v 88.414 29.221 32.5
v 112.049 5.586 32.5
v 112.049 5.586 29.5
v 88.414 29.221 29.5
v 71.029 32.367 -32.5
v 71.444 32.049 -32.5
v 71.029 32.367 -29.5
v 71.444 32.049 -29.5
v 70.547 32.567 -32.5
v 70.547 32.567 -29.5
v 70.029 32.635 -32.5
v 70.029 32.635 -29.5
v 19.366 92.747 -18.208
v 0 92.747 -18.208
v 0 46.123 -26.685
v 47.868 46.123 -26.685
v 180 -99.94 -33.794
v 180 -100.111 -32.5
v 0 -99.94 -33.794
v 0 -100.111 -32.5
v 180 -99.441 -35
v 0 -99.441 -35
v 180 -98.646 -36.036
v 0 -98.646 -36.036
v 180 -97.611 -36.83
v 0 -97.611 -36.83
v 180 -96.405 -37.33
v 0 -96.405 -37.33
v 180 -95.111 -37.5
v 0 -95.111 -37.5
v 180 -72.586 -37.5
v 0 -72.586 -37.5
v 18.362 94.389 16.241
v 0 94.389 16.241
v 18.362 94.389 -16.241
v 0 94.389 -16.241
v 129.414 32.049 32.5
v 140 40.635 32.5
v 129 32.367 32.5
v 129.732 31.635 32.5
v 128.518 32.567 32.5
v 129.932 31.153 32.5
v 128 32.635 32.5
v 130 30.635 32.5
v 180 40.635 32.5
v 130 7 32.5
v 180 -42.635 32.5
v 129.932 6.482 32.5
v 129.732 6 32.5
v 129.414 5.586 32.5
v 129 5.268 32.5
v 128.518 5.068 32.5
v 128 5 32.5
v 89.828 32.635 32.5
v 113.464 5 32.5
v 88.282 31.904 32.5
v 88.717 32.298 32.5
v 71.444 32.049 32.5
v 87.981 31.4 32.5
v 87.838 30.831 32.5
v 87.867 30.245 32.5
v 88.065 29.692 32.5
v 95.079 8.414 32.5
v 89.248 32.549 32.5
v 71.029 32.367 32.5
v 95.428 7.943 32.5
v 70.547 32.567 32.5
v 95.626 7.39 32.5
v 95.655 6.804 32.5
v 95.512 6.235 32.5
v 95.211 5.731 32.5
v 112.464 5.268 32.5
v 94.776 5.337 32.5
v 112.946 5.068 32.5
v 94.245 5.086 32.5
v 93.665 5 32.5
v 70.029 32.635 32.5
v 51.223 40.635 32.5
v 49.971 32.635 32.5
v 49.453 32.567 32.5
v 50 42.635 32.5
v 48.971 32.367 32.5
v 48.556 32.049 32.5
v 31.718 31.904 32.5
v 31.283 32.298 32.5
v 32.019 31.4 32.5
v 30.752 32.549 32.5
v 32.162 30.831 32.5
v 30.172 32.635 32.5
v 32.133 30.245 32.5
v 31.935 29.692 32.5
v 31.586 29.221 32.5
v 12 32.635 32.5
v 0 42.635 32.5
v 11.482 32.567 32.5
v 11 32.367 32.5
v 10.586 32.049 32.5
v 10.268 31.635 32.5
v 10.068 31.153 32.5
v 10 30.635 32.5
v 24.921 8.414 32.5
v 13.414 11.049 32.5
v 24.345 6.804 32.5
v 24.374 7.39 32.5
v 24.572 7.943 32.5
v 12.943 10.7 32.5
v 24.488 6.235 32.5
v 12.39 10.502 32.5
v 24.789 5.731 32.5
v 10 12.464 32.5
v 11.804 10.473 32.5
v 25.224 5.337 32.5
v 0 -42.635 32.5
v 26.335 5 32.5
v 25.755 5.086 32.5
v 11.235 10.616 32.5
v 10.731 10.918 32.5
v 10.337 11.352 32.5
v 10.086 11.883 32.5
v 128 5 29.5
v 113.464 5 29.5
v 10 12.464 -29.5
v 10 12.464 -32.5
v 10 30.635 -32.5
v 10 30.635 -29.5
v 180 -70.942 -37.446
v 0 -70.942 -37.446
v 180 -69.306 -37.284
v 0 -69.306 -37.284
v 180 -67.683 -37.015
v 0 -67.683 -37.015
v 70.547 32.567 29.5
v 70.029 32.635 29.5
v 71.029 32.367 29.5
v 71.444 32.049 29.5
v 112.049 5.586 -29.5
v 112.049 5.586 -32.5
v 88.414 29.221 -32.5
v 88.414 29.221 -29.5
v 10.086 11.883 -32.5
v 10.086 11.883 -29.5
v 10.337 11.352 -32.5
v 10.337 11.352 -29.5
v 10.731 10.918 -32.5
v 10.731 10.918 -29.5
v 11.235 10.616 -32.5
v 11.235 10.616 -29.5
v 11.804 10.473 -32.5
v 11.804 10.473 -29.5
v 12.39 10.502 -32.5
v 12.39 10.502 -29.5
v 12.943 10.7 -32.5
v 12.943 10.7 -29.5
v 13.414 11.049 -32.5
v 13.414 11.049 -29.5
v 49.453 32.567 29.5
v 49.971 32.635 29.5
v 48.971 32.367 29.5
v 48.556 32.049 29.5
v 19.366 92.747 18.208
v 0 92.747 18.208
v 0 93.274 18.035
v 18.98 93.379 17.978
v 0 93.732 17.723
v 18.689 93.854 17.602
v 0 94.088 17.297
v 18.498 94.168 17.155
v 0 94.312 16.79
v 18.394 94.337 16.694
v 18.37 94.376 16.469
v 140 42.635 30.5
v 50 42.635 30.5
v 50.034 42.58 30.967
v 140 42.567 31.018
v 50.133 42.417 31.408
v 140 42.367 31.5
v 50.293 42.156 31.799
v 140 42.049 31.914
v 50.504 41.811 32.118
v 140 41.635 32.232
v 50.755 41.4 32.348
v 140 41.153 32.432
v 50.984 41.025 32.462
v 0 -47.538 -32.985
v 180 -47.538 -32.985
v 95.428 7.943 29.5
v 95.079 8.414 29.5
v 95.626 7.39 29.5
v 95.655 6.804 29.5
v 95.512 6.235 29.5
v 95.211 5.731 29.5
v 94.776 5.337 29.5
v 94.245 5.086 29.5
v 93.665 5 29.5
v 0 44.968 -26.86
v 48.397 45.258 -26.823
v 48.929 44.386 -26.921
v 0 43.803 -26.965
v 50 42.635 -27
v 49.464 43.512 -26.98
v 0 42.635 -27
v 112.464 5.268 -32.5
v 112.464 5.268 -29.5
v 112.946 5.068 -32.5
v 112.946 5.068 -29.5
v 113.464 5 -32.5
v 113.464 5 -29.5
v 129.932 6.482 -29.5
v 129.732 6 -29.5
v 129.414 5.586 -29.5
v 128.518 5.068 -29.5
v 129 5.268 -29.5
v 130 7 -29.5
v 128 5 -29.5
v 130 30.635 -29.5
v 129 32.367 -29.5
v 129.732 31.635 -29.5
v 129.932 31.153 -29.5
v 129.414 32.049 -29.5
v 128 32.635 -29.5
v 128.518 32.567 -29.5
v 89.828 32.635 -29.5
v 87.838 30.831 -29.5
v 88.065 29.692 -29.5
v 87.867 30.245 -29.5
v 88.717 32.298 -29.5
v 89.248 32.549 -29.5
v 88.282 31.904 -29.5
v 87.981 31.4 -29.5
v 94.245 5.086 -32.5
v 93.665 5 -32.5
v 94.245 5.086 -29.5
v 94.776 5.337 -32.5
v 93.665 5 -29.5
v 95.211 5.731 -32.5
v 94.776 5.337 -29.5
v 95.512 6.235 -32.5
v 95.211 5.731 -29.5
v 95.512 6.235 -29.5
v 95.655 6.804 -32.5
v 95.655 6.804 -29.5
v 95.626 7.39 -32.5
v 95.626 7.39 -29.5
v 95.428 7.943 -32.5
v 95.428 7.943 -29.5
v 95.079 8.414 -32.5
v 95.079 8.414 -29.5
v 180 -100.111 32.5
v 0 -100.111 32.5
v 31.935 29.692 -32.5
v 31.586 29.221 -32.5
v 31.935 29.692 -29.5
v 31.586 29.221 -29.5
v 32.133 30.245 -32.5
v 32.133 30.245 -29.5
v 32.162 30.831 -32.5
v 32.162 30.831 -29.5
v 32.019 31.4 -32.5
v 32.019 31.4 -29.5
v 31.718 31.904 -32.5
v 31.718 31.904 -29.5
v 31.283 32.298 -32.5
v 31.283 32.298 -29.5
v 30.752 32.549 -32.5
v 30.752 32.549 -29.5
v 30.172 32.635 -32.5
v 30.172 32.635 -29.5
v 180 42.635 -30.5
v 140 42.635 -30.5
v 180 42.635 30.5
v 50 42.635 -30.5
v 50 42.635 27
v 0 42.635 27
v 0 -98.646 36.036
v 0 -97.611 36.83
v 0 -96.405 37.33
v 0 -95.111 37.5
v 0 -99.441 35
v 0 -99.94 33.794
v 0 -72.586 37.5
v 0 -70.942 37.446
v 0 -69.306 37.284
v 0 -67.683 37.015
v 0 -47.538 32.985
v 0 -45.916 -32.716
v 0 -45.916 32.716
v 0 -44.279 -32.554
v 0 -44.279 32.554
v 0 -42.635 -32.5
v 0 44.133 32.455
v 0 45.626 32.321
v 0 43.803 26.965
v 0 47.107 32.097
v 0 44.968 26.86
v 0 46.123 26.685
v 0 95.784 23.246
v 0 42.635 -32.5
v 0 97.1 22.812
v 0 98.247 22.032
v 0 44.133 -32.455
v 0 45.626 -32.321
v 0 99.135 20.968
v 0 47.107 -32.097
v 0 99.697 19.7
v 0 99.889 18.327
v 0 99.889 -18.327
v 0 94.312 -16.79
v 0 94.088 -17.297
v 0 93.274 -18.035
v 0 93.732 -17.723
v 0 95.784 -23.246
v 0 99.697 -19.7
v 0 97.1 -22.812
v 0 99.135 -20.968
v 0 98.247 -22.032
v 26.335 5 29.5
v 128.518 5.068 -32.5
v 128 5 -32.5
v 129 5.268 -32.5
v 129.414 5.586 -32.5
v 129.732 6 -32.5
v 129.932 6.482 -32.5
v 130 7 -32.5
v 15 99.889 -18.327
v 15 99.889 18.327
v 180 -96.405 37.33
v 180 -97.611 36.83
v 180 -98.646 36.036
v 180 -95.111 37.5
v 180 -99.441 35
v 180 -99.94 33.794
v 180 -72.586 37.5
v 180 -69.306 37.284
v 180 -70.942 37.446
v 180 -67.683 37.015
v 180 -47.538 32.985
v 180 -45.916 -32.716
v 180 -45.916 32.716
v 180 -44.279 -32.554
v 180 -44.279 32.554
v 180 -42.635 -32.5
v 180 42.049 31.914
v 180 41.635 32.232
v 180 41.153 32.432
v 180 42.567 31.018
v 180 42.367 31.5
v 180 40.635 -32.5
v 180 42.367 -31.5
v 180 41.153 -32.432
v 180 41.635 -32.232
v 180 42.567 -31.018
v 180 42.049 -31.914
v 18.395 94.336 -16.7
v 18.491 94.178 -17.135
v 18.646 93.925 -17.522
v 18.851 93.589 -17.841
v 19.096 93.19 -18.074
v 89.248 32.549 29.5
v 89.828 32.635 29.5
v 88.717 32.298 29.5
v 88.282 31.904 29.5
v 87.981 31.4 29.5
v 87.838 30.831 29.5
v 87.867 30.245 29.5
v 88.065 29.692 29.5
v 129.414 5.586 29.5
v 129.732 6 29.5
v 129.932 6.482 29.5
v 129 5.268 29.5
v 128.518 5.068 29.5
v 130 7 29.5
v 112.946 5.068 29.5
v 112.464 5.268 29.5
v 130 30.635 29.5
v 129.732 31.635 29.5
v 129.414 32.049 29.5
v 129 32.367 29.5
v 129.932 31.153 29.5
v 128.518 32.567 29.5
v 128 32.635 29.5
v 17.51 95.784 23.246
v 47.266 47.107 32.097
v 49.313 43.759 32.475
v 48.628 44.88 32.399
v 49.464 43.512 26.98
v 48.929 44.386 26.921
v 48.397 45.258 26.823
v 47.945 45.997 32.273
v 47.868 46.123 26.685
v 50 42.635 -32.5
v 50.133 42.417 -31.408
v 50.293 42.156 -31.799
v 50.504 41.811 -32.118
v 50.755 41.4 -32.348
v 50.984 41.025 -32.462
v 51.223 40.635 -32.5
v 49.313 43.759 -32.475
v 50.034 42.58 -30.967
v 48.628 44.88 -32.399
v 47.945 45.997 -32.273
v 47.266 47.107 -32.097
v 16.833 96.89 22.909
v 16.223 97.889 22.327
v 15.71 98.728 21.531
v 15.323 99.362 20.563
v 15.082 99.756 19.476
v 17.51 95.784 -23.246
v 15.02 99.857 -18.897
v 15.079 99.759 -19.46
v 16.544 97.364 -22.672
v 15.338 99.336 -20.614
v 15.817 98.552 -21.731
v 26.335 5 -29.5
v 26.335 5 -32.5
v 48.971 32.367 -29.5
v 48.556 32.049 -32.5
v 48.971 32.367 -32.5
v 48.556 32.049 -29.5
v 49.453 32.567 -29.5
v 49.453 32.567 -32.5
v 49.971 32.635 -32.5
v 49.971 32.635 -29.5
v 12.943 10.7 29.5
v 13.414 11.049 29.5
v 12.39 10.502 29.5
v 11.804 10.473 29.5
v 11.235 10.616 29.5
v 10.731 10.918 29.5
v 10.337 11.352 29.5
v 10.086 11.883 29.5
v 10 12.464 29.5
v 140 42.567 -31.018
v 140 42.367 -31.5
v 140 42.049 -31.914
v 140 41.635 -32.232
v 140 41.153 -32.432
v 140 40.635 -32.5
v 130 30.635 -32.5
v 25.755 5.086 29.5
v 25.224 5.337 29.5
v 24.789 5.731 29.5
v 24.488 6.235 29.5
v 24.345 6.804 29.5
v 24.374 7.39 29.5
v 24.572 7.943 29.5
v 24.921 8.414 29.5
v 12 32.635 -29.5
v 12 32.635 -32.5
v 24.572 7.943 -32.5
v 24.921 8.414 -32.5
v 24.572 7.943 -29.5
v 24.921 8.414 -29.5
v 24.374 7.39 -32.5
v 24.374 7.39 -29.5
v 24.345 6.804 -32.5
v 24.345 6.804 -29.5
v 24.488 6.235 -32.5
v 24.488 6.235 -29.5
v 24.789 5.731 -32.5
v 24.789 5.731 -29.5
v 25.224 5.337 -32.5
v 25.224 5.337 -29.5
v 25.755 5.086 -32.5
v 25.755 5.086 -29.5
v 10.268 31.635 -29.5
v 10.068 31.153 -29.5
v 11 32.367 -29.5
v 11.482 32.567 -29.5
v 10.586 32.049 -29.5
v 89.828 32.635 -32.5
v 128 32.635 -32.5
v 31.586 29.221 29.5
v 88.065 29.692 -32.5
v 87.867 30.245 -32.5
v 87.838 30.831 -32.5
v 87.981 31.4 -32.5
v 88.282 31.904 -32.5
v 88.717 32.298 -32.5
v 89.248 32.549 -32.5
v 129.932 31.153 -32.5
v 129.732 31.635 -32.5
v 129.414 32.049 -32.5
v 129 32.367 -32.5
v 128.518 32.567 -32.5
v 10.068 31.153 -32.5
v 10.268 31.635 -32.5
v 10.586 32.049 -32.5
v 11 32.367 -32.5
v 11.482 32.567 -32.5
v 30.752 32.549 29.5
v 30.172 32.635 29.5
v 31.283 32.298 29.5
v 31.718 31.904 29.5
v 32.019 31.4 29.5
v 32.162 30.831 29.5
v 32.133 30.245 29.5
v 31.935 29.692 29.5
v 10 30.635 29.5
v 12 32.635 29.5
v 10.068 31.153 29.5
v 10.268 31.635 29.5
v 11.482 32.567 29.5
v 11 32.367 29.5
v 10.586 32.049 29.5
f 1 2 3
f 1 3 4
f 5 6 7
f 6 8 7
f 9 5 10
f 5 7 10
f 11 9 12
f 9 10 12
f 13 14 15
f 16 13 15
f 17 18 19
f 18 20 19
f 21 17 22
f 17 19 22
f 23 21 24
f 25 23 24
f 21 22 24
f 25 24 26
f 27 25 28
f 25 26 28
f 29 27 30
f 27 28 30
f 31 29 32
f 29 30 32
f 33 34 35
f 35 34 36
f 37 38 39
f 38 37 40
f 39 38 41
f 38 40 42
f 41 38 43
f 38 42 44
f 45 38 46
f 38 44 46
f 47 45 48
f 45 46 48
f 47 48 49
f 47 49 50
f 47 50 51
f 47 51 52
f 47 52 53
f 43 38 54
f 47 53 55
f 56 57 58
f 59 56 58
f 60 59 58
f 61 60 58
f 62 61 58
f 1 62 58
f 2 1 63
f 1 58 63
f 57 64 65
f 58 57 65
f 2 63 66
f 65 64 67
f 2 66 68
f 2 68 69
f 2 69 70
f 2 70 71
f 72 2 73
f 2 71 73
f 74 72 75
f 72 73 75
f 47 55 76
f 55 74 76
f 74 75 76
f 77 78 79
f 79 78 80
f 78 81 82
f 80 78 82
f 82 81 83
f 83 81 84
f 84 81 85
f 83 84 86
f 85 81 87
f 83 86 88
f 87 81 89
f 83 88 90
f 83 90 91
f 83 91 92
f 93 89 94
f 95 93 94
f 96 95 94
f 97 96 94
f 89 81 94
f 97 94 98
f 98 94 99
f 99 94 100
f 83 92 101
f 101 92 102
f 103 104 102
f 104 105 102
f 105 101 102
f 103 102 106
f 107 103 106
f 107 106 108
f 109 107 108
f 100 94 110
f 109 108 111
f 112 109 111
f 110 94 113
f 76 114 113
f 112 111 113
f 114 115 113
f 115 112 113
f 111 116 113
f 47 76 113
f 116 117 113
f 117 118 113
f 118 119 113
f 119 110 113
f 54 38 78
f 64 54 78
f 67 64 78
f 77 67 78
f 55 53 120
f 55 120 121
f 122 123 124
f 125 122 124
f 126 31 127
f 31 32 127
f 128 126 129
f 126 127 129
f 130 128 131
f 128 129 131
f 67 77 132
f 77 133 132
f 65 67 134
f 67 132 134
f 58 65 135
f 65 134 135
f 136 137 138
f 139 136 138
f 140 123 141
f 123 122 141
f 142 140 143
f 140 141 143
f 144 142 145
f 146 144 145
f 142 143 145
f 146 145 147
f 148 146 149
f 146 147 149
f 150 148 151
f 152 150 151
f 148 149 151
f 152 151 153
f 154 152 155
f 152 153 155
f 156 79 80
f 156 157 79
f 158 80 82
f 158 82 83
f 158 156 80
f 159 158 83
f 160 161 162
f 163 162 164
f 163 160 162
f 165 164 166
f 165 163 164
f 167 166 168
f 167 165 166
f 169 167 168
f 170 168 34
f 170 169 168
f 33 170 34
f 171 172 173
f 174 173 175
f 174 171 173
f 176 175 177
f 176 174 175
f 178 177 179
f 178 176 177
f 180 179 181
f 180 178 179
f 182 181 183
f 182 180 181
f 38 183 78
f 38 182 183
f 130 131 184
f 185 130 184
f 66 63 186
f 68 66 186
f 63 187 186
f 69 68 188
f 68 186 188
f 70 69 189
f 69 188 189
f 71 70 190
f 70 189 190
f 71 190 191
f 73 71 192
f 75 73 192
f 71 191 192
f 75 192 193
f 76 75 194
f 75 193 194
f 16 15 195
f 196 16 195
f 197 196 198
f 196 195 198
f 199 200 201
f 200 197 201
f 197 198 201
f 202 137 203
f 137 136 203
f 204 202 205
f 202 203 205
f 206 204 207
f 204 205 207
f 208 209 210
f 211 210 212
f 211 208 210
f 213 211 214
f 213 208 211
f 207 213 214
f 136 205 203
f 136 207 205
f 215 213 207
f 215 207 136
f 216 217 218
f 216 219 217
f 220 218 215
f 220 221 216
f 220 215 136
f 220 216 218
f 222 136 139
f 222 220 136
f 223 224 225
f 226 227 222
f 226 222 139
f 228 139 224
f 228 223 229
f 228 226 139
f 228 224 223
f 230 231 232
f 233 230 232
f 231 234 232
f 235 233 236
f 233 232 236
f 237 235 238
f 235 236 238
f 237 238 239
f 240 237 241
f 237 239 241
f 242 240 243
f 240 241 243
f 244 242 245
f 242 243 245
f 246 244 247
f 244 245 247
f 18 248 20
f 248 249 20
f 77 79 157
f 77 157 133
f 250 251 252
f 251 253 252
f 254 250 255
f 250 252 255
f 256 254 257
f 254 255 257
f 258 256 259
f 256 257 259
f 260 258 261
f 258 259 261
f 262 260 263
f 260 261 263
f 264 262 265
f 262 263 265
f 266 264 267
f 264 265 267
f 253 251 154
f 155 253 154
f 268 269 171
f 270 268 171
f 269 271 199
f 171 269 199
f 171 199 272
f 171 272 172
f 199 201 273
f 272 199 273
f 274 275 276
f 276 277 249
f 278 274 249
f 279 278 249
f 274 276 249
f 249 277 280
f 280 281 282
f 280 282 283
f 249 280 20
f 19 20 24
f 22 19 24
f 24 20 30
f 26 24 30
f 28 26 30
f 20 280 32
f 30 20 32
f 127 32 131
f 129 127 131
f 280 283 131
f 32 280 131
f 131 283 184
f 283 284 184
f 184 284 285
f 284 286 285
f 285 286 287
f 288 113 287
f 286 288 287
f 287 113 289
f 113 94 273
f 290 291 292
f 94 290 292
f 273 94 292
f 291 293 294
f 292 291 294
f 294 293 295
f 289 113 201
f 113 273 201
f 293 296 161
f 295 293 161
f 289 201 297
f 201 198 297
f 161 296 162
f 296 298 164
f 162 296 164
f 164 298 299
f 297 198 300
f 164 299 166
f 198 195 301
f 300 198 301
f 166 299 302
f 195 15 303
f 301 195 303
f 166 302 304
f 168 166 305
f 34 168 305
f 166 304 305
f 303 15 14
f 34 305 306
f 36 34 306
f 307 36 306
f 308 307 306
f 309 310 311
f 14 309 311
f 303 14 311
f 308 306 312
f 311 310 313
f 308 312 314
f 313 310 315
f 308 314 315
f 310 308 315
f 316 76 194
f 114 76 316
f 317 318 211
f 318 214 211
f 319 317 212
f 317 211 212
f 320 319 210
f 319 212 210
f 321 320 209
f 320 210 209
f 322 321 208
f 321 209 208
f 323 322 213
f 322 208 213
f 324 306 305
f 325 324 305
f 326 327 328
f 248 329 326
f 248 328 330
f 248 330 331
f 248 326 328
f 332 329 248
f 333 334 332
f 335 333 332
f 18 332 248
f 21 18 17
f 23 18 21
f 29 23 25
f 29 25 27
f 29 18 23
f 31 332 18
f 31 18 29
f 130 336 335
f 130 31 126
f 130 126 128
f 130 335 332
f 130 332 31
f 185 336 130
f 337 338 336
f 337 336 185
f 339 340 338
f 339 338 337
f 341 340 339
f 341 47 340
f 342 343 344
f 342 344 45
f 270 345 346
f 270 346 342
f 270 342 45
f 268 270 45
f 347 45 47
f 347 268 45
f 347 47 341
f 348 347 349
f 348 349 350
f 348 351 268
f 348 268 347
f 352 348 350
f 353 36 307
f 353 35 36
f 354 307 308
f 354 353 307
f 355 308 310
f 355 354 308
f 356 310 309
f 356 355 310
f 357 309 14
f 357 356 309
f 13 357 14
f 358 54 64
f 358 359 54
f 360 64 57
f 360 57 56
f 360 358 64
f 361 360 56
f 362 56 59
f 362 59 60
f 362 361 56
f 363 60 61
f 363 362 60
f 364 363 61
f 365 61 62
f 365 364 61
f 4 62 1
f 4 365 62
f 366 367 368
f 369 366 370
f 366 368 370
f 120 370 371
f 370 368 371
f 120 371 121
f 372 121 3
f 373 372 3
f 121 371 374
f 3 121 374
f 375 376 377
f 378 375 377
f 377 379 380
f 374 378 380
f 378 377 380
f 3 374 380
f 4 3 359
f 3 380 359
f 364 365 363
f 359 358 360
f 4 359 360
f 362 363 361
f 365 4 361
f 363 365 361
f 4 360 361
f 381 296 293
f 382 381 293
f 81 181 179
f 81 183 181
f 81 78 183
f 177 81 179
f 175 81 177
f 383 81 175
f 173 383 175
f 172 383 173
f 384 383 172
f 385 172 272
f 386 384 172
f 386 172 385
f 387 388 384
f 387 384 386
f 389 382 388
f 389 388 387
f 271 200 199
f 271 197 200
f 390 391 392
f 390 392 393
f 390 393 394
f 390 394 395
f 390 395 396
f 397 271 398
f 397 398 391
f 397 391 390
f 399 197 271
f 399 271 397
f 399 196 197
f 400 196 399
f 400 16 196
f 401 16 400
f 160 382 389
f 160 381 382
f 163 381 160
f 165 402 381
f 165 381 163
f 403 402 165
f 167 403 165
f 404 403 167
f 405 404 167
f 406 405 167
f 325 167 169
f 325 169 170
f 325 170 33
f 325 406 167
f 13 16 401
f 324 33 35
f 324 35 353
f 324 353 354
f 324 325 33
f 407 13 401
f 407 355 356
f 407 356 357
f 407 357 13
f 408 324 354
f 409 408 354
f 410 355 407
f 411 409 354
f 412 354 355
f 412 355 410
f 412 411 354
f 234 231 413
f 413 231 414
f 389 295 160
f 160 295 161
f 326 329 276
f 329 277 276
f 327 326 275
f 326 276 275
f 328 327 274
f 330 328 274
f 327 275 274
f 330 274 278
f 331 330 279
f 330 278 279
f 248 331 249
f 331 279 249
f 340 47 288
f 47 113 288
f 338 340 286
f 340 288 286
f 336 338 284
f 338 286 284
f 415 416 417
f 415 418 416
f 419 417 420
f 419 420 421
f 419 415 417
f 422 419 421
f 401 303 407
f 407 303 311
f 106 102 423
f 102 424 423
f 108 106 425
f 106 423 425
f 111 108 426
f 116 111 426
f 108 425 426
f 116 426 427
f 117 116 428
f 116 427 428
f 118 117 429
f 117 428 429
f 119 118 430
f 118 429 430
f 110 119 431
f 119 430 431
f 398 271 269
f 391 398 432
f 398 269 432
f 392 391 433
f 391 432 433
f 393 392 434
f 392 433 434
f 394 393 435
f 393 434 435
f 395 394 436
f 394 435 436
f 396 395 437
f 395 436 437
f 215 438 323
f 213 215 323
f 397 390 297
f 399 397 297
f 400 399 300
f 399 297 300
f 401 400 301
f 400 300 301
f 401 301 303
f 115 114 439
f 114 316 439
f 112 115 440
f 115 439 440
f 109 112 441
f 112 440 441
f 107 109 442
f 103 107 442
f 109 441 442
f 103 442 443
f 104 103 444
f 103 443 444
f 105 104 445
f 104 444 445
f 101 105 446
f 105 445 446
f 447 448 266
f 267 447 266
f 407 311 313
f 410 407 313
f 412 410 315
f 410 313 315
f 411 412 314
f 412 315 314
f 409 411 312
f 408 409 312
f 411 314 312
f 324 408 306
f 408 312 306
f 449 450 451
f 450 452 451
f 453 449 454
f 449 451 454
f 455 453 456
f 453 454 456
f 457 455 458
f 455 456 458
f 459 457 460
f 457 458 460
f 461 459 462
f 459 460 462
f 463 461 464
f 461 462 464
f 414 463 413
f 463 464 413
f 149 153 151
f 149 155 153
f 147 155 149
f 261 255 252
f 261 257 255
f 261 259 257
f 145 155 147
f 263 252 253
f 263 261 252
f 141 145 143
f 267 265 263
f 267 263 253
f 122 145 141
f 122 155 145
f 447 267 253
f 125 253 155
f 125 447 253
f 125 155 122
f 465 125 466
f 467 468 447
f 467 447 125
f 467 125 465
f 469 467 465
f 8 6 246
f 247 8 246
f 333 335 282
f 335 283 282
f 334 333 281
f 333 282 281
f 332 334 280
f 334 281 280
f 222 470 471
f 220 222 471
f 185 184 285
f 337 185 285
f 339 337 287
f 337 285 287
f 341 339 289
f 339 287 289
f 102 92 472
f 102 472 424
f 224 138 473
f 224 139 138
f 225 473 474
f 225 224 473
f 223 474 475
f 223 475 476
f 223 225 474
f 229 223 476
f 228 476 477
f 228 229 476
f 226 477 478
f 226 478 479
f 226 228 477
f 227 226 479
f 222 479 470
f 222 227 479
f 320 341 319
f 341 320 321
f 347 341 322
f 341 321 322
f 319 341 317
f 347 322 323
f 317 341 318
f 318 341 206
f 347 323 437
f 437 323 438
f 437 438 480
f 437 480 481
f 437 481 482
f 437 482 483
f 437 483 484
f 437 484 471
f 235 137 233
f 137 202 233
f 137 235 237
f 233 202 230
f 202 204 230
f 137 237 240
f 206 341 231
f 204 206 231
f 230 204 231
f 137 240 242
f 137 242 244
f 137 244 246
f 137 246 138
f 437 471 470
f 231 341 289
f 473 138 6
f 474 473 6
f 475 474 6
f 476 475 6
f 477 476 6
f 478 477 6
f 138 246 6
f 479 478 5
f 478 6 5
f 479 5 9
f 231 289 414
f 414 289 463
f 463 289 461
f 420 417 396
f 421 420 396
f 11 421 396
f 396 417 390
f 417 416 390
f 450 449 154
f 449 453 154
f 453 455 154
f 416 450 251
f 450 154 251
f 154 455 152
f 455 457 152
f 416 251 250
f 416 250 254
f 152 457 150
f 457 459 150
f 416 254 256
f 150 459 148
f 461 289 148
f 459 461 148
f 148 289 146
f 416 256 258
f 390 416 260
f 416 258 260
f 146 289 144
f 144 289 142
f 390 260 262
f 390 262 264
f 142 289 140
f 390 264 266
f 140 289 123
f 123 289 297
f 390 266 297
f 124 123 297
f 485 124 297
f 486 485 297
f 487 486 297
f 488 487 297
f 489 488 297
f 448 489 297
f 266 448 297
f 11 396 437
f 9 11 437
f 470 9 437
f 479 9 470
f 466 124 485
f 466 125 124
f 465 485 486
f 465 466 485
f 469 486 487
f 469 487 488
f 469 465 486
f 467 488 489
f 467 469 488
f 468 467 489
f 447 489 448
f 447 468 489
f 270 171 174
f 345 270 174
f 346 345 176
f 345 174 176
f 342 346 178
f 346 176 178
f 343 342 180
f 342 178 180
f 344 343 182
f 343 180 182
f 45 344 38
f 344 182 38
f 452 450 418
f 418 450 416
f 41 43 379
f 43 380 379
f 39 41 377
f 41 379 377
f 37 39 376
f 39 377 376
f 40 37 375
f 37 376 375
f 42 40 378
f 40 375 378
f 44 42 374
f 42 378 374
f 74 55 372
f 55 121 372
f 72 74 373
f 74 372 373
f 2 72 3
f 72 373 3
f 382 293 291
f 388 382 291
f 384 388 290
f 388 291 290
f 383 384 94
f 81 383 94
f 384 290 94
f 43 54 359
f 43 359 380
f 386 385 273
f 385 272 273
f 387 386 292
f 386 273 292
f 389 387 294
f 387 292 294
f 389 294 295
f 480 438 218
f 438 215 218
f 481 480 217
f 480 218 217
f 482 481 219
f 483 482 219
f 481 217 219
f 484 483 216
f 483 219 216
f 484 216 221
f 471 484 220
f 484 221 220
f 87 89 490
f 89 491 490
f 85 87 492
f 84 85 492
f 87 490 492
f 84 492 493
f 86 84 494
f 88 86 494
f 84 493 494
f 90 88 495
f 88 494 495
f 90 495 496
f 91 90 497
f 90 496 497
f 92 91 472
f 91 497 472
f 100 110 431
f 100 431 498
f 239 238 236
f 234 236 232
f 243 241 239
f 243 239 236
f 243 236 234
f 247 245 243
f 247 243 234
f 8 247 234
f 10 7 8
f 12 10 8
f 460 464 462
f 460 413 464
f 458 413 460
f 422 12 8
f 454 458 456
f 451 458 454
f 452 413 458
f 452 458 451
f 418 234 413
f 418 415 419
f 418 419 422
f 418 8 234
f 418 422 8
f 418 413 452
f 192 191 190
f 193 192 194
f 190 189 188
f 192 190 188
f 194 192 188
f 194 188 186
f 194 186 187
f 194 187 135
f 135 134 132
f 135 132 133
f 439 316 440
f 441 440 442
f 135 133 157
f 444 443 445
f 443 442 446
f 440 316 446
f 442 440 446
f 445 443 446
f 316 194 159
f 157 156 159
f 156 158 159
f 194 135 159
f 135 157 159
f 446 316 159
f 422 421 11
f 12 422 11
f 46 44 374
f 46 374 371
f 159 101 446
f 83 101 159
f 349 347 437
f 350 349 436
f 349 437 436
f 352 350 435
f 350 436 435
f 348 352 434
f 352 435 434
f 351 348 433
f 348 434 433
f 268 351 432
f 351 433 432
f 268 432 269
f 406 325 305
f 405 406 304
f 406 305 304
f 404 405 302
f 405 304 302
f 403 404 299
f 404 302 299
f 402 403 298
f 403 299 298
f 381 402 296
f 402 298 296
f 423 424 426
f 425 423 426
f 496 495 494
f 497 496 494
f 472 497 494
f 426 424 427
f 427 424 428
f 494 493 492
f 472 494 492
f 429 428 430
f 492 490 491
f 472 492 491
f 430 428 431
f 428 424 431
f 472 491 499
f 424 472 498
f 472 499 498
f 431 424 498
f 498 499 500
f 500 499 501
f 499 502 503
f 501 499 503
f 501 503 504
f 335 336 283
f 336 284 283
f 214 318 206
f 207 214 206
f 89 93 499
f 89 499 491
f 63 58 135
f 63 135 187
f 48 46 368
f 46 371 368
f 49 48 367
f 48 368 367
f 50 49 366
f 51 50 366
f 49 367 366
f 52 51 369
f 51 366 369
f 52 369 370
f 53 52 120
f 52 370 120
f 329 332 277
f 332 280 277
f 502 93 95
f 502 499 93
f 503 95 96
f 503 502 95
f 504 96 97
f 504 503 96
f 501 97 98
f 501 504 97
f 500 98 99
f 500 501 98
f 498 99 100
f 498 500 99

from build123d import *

# Parameters (mm, degrees)
EXTRUDE_2_DEPTH        = 140
SKETCH_7_W             = 65
SKETCH_7_H             = 74.928349175
CUT_EXTRUDE_2_DEPTH    = 150
CUT_EXTRUDE_3_DEPTH    = 150
FILLET_1_R             = 2
FILLET_2_R             = 2
CUT_EXTRUDE_4_DEPTH    = 3
FILLET_3_R             = 2
FILLET_3_OF_MIRROR_1_R = 2
EXTRUDE_3_DEPTH        = 40


with BuildPart() as part:
    # 草图2 → 凸台-拉伸2 (new body)
    with BuildSketch(Plane(origin=(0, 0, 0), x_dir=(0, 0, -1), z_dir=(1, 0, 0))):
        with BuildLine():
            Line((37.5, -95.110619623), (37.5, -72.586107463))
            ThreePointArc((37.5, -72.586107463), (37.378333167, -70.122667014), (37.014516892, -67.683204084))
            Line((37.014516892, -67.683204084), (32.985483108, -47.538035162))
            ThreePointArc((32.985483108, -47.538035162), (32.621666833, -45.098572232), (32.5, -42.635131783))
            Line((32.5, -42.635131783), (32.5, 42.635131783))
            ThreePointArc((32.5, 42.635131783), (32.398982849, 44.880271666), (32.096747752, 47.107267738))
            Line((32.096747752, 47.107267738), (23.246467783, 95.783807568))
            ThreePointArc((23.246467783, 95.783807568), (21.530855429, 98.728139028), (18.327118233, 99.889380377))
            Line((18.327118233, 99.889380377), (-18.327118233, 99.889380377))
            ThreePointArc((-18.327118233, 99.889380377), (-21.530855429, 98.728139028), (-23.246467783, 95.783807568))
            Line((-23.246467783, 95.783807568), (-32.096747752, 47.107267738))
            ThreePointArc((-32.096747752, 47.107267738), (-32.398982849, 44.880271666), (-32.5, 42.635131783))
            Line((-32.5, 42.635131783), (-32.5, -42.635131783))
            ThreePointArc((-32.5, -42.635131783), (-32.621666833, -45.098572232), (-32.985483108, -47.538035162))
            Line((-32.985483108, -47.538035162), (-37.014516892, -67.683204084))
            ThreePointArc((-37.014516892, -67.683204084), (-37.378333167, -70.122667014), (-37.5, -72.586107463))
            Line((-37.5, -72.586107463), (-37.5, -95.110619623))
            ThreePointArc((-37.5, -95.110619623), (-36.035533906, -98.646153529), (-32.5, -100.110619623))
            Line((-32.5, -100.110619623), (32.5, -100.110619623))
            ThreePointArc((32.5, -100.110619623), (36.035533906, -98.646153529), (37.5, -95.110619623))
        make_face()
    extrude(amount=EXTRUDE_2_DEPTH)

    # 草图7 → 切除-拉伸2 (cut, along a direction that is not the sketch's normal)
    with BuildSketch(Plane(origin=(55.371135265, 33.848837106, 0), x_dir=(0, 0, -1), z_dir=(0.853206949, 0.521572529, 0))):
        with Locations((0, 47.762138861)):
            Rectangle(SKETCH_7_W, SKETCH_7_H)
    extrude(amount=CUT_EXTRUDE_2_DEPTH, dir=(1, 0, 0), mode=Mode.SUBTRACT)

    # 草图8 → 切除-拉伸3 (cut)
    with BuildSketch(Plane.ZY):
        with BuildLine():
            Line((17.909830056, 94.389380377), (-17.909830056, 94.389380377))
            Line((-17.909830056, 94.389380377), (-26.685463247, 46.123397828))
            ThreePointArc((-26.685463247, 46.123397828), (-26.921206622, 44.386340892), (-27, 42.635131783))
            Line((-27, 42.635131783), (27, 42.635131783))
            ThreePointArc((27, 42.635131783), (26.921206622, 44.386340892), (26.685463247, 46.123397828))
            Line((26.685463247, 46.123397828), (17.909830056, 94.389380377))
        make_face()
    extrude(amount=-CUT_EXTRUDE_3_DEPTH, mode=Mode.SUBTRACT)

    # 圆角1
    fillet_1_edges = [part.edges().sort_by_distance(p)[0] for p in [
        (9.181097951, 94.389380377, 17.909830056),
        (9.181097951, 94.389380377, -17.909830056),
    ]]
    fillet(fillet_1_edges, radius=FILLET_1_R)

    # 圆角2
    fillet_2_edges = [part.edges().sort_by_distance(p)[0] for p in [
        (95, 42.635131783, 32.5),
        (95, 42.635131783, -32.5),
    ]]
    fillet(fillet_2_edges, radius=FILLET_2_R)

    # 草图9 → 切除-拉伸4 (cut)
    with BuildSketch(Plane(origin=(0, 0, -32.5), x_dir=(-1, 0, 0), z_dir=(0, 0, -1))):
        Polygon((-85, 32.635131783), (-130, 32.635131783), (-130, 5), (-112.635131783, 5), align=None)
        Polygon((-49.142135624, 32.635131783), (-70.857864376, 32.635131783), (-98.492996159, 5), (-21.507003841, 5), align=None)
        Polygon((-10, 32.635131783), (-35, 32.635131783), (-10, 7.635131783), align=None)
    cut_extrude_4 = extrude(amount=-CUT_EXTRUDE_4_DEPTH, mode=Mode.SUBTRACT)

    # 圆角3
    fillet_3_edges = [part.edges().sort_by_distance(p)[0] for p in [
        (21.507003841, 5, -31),
        (98.492996159, 5, -31),
        (70.857864376, 32.635131783, -31),
        (49.142135624, 32.635131783, -31),
        (35, 32.635131783, -31),
        (10, 32.635131783, -31),
        (10, 7.635131783, -31),
        (85, 32.635131783, -31),
        (112.635131783, 5, -31),
        (130, 5, -31),
        (130, 32.635131783, -31),
    ]]
    fillet(fillet_3_edges, radius=FILLET_3_R)

    # 镜向1: 切除-拉伸4 across plane
    add(cut_extrude_4.mirror(Plane.XY), mode=Mode.SUBTRACT)

    # 圆角3 of 镜向1
    fillet_3_of_mirror_1_edges = [part.edges().sort_by_distance(p)[0] for p in [
        (21.507003841, 5, 31),
        (98.492996159, 5, 31),
        (70.857864376, 32.635131783, 31),
        (49.142135624, 32.635131783, 31),
        (35, 32.635131783, 31),
        (10, 32.635131783, 31),
        (10, 7.635131783, 31),
        (85, 32.635131783, 31),
        (112.635131783, 5, 31),
        (130, 5, 31),
        (130, 32.635131783, 31),
    ]]
    fillet(fillet_3_of_mirror_1_edges, radius=FILLET_3_OF_MIRROR_1_R)

    # 草图10 → 凸台-拉伸3 (add)
    with BuildSketch(Plane(origin=(140, 0, 0), x_dir=(0, 0, -1), z_dir=(1, 0, 0))):
        with BuildLine():
            Line((32.5, -42.635131783), (32.5, 40.635131783))
            ThreePointArc((32.5, 40.635131783), (31.914213562, 42.049345346), (30.5, 42.635131783))
            Line((30.5, 42.635131783), (-30.5, 42.635131783))
            ThreePointArc((-30.5, 42.635131783), (-31.914213562, 42.049345346), (-32.5, 40.635131783))
            Line((-32.5, 40.635131783), (-32.5, -42.635131783))
            ThreePointArc((-32.5, -42.635131783), (-32.621666833, -45.098572232), (-32.985483108, -47.538035162))
            Line((-32.985483108, -47.538035162), (-37.014516892, -67.683204084))
            ThreePointArc((-37.014516892, -67.683204084), (-37.378333167, -70.122667014), (-37.5, -72.586107463))
            Line((-37.5, -72.586107463), (-37.5, -95.110619623))
            ThreePointArc((-37.5, -95.110619623), (-36.035533906, -98.646153529), (-32.5, -100.110619623))
            Line((-32.5, -100.110619623), (32.5, -100.110619623))
            ThreePointArc((32.5, -100.110619623), (36.035533906, -98.646153529), (37.5, -95.110619623))
            Line((37.5, -95.110619623), (37.5, -72.586107463))
            ThreePointArc((37.5, -72.586107463), (37.378333167, -70.122667014), (37.014516892, -67.683204084))
            Line((37.014516892, -67.683204084), (32.985483108, -47.538035162))
            ThreePointArc((32.985483108, -47.538035162), (32.621666833, -45.098572232), (32.5, -42.635131783))
        make_face()
    extrude(amount=EXTRUDE_3_DEPTH)


solid = part.part
